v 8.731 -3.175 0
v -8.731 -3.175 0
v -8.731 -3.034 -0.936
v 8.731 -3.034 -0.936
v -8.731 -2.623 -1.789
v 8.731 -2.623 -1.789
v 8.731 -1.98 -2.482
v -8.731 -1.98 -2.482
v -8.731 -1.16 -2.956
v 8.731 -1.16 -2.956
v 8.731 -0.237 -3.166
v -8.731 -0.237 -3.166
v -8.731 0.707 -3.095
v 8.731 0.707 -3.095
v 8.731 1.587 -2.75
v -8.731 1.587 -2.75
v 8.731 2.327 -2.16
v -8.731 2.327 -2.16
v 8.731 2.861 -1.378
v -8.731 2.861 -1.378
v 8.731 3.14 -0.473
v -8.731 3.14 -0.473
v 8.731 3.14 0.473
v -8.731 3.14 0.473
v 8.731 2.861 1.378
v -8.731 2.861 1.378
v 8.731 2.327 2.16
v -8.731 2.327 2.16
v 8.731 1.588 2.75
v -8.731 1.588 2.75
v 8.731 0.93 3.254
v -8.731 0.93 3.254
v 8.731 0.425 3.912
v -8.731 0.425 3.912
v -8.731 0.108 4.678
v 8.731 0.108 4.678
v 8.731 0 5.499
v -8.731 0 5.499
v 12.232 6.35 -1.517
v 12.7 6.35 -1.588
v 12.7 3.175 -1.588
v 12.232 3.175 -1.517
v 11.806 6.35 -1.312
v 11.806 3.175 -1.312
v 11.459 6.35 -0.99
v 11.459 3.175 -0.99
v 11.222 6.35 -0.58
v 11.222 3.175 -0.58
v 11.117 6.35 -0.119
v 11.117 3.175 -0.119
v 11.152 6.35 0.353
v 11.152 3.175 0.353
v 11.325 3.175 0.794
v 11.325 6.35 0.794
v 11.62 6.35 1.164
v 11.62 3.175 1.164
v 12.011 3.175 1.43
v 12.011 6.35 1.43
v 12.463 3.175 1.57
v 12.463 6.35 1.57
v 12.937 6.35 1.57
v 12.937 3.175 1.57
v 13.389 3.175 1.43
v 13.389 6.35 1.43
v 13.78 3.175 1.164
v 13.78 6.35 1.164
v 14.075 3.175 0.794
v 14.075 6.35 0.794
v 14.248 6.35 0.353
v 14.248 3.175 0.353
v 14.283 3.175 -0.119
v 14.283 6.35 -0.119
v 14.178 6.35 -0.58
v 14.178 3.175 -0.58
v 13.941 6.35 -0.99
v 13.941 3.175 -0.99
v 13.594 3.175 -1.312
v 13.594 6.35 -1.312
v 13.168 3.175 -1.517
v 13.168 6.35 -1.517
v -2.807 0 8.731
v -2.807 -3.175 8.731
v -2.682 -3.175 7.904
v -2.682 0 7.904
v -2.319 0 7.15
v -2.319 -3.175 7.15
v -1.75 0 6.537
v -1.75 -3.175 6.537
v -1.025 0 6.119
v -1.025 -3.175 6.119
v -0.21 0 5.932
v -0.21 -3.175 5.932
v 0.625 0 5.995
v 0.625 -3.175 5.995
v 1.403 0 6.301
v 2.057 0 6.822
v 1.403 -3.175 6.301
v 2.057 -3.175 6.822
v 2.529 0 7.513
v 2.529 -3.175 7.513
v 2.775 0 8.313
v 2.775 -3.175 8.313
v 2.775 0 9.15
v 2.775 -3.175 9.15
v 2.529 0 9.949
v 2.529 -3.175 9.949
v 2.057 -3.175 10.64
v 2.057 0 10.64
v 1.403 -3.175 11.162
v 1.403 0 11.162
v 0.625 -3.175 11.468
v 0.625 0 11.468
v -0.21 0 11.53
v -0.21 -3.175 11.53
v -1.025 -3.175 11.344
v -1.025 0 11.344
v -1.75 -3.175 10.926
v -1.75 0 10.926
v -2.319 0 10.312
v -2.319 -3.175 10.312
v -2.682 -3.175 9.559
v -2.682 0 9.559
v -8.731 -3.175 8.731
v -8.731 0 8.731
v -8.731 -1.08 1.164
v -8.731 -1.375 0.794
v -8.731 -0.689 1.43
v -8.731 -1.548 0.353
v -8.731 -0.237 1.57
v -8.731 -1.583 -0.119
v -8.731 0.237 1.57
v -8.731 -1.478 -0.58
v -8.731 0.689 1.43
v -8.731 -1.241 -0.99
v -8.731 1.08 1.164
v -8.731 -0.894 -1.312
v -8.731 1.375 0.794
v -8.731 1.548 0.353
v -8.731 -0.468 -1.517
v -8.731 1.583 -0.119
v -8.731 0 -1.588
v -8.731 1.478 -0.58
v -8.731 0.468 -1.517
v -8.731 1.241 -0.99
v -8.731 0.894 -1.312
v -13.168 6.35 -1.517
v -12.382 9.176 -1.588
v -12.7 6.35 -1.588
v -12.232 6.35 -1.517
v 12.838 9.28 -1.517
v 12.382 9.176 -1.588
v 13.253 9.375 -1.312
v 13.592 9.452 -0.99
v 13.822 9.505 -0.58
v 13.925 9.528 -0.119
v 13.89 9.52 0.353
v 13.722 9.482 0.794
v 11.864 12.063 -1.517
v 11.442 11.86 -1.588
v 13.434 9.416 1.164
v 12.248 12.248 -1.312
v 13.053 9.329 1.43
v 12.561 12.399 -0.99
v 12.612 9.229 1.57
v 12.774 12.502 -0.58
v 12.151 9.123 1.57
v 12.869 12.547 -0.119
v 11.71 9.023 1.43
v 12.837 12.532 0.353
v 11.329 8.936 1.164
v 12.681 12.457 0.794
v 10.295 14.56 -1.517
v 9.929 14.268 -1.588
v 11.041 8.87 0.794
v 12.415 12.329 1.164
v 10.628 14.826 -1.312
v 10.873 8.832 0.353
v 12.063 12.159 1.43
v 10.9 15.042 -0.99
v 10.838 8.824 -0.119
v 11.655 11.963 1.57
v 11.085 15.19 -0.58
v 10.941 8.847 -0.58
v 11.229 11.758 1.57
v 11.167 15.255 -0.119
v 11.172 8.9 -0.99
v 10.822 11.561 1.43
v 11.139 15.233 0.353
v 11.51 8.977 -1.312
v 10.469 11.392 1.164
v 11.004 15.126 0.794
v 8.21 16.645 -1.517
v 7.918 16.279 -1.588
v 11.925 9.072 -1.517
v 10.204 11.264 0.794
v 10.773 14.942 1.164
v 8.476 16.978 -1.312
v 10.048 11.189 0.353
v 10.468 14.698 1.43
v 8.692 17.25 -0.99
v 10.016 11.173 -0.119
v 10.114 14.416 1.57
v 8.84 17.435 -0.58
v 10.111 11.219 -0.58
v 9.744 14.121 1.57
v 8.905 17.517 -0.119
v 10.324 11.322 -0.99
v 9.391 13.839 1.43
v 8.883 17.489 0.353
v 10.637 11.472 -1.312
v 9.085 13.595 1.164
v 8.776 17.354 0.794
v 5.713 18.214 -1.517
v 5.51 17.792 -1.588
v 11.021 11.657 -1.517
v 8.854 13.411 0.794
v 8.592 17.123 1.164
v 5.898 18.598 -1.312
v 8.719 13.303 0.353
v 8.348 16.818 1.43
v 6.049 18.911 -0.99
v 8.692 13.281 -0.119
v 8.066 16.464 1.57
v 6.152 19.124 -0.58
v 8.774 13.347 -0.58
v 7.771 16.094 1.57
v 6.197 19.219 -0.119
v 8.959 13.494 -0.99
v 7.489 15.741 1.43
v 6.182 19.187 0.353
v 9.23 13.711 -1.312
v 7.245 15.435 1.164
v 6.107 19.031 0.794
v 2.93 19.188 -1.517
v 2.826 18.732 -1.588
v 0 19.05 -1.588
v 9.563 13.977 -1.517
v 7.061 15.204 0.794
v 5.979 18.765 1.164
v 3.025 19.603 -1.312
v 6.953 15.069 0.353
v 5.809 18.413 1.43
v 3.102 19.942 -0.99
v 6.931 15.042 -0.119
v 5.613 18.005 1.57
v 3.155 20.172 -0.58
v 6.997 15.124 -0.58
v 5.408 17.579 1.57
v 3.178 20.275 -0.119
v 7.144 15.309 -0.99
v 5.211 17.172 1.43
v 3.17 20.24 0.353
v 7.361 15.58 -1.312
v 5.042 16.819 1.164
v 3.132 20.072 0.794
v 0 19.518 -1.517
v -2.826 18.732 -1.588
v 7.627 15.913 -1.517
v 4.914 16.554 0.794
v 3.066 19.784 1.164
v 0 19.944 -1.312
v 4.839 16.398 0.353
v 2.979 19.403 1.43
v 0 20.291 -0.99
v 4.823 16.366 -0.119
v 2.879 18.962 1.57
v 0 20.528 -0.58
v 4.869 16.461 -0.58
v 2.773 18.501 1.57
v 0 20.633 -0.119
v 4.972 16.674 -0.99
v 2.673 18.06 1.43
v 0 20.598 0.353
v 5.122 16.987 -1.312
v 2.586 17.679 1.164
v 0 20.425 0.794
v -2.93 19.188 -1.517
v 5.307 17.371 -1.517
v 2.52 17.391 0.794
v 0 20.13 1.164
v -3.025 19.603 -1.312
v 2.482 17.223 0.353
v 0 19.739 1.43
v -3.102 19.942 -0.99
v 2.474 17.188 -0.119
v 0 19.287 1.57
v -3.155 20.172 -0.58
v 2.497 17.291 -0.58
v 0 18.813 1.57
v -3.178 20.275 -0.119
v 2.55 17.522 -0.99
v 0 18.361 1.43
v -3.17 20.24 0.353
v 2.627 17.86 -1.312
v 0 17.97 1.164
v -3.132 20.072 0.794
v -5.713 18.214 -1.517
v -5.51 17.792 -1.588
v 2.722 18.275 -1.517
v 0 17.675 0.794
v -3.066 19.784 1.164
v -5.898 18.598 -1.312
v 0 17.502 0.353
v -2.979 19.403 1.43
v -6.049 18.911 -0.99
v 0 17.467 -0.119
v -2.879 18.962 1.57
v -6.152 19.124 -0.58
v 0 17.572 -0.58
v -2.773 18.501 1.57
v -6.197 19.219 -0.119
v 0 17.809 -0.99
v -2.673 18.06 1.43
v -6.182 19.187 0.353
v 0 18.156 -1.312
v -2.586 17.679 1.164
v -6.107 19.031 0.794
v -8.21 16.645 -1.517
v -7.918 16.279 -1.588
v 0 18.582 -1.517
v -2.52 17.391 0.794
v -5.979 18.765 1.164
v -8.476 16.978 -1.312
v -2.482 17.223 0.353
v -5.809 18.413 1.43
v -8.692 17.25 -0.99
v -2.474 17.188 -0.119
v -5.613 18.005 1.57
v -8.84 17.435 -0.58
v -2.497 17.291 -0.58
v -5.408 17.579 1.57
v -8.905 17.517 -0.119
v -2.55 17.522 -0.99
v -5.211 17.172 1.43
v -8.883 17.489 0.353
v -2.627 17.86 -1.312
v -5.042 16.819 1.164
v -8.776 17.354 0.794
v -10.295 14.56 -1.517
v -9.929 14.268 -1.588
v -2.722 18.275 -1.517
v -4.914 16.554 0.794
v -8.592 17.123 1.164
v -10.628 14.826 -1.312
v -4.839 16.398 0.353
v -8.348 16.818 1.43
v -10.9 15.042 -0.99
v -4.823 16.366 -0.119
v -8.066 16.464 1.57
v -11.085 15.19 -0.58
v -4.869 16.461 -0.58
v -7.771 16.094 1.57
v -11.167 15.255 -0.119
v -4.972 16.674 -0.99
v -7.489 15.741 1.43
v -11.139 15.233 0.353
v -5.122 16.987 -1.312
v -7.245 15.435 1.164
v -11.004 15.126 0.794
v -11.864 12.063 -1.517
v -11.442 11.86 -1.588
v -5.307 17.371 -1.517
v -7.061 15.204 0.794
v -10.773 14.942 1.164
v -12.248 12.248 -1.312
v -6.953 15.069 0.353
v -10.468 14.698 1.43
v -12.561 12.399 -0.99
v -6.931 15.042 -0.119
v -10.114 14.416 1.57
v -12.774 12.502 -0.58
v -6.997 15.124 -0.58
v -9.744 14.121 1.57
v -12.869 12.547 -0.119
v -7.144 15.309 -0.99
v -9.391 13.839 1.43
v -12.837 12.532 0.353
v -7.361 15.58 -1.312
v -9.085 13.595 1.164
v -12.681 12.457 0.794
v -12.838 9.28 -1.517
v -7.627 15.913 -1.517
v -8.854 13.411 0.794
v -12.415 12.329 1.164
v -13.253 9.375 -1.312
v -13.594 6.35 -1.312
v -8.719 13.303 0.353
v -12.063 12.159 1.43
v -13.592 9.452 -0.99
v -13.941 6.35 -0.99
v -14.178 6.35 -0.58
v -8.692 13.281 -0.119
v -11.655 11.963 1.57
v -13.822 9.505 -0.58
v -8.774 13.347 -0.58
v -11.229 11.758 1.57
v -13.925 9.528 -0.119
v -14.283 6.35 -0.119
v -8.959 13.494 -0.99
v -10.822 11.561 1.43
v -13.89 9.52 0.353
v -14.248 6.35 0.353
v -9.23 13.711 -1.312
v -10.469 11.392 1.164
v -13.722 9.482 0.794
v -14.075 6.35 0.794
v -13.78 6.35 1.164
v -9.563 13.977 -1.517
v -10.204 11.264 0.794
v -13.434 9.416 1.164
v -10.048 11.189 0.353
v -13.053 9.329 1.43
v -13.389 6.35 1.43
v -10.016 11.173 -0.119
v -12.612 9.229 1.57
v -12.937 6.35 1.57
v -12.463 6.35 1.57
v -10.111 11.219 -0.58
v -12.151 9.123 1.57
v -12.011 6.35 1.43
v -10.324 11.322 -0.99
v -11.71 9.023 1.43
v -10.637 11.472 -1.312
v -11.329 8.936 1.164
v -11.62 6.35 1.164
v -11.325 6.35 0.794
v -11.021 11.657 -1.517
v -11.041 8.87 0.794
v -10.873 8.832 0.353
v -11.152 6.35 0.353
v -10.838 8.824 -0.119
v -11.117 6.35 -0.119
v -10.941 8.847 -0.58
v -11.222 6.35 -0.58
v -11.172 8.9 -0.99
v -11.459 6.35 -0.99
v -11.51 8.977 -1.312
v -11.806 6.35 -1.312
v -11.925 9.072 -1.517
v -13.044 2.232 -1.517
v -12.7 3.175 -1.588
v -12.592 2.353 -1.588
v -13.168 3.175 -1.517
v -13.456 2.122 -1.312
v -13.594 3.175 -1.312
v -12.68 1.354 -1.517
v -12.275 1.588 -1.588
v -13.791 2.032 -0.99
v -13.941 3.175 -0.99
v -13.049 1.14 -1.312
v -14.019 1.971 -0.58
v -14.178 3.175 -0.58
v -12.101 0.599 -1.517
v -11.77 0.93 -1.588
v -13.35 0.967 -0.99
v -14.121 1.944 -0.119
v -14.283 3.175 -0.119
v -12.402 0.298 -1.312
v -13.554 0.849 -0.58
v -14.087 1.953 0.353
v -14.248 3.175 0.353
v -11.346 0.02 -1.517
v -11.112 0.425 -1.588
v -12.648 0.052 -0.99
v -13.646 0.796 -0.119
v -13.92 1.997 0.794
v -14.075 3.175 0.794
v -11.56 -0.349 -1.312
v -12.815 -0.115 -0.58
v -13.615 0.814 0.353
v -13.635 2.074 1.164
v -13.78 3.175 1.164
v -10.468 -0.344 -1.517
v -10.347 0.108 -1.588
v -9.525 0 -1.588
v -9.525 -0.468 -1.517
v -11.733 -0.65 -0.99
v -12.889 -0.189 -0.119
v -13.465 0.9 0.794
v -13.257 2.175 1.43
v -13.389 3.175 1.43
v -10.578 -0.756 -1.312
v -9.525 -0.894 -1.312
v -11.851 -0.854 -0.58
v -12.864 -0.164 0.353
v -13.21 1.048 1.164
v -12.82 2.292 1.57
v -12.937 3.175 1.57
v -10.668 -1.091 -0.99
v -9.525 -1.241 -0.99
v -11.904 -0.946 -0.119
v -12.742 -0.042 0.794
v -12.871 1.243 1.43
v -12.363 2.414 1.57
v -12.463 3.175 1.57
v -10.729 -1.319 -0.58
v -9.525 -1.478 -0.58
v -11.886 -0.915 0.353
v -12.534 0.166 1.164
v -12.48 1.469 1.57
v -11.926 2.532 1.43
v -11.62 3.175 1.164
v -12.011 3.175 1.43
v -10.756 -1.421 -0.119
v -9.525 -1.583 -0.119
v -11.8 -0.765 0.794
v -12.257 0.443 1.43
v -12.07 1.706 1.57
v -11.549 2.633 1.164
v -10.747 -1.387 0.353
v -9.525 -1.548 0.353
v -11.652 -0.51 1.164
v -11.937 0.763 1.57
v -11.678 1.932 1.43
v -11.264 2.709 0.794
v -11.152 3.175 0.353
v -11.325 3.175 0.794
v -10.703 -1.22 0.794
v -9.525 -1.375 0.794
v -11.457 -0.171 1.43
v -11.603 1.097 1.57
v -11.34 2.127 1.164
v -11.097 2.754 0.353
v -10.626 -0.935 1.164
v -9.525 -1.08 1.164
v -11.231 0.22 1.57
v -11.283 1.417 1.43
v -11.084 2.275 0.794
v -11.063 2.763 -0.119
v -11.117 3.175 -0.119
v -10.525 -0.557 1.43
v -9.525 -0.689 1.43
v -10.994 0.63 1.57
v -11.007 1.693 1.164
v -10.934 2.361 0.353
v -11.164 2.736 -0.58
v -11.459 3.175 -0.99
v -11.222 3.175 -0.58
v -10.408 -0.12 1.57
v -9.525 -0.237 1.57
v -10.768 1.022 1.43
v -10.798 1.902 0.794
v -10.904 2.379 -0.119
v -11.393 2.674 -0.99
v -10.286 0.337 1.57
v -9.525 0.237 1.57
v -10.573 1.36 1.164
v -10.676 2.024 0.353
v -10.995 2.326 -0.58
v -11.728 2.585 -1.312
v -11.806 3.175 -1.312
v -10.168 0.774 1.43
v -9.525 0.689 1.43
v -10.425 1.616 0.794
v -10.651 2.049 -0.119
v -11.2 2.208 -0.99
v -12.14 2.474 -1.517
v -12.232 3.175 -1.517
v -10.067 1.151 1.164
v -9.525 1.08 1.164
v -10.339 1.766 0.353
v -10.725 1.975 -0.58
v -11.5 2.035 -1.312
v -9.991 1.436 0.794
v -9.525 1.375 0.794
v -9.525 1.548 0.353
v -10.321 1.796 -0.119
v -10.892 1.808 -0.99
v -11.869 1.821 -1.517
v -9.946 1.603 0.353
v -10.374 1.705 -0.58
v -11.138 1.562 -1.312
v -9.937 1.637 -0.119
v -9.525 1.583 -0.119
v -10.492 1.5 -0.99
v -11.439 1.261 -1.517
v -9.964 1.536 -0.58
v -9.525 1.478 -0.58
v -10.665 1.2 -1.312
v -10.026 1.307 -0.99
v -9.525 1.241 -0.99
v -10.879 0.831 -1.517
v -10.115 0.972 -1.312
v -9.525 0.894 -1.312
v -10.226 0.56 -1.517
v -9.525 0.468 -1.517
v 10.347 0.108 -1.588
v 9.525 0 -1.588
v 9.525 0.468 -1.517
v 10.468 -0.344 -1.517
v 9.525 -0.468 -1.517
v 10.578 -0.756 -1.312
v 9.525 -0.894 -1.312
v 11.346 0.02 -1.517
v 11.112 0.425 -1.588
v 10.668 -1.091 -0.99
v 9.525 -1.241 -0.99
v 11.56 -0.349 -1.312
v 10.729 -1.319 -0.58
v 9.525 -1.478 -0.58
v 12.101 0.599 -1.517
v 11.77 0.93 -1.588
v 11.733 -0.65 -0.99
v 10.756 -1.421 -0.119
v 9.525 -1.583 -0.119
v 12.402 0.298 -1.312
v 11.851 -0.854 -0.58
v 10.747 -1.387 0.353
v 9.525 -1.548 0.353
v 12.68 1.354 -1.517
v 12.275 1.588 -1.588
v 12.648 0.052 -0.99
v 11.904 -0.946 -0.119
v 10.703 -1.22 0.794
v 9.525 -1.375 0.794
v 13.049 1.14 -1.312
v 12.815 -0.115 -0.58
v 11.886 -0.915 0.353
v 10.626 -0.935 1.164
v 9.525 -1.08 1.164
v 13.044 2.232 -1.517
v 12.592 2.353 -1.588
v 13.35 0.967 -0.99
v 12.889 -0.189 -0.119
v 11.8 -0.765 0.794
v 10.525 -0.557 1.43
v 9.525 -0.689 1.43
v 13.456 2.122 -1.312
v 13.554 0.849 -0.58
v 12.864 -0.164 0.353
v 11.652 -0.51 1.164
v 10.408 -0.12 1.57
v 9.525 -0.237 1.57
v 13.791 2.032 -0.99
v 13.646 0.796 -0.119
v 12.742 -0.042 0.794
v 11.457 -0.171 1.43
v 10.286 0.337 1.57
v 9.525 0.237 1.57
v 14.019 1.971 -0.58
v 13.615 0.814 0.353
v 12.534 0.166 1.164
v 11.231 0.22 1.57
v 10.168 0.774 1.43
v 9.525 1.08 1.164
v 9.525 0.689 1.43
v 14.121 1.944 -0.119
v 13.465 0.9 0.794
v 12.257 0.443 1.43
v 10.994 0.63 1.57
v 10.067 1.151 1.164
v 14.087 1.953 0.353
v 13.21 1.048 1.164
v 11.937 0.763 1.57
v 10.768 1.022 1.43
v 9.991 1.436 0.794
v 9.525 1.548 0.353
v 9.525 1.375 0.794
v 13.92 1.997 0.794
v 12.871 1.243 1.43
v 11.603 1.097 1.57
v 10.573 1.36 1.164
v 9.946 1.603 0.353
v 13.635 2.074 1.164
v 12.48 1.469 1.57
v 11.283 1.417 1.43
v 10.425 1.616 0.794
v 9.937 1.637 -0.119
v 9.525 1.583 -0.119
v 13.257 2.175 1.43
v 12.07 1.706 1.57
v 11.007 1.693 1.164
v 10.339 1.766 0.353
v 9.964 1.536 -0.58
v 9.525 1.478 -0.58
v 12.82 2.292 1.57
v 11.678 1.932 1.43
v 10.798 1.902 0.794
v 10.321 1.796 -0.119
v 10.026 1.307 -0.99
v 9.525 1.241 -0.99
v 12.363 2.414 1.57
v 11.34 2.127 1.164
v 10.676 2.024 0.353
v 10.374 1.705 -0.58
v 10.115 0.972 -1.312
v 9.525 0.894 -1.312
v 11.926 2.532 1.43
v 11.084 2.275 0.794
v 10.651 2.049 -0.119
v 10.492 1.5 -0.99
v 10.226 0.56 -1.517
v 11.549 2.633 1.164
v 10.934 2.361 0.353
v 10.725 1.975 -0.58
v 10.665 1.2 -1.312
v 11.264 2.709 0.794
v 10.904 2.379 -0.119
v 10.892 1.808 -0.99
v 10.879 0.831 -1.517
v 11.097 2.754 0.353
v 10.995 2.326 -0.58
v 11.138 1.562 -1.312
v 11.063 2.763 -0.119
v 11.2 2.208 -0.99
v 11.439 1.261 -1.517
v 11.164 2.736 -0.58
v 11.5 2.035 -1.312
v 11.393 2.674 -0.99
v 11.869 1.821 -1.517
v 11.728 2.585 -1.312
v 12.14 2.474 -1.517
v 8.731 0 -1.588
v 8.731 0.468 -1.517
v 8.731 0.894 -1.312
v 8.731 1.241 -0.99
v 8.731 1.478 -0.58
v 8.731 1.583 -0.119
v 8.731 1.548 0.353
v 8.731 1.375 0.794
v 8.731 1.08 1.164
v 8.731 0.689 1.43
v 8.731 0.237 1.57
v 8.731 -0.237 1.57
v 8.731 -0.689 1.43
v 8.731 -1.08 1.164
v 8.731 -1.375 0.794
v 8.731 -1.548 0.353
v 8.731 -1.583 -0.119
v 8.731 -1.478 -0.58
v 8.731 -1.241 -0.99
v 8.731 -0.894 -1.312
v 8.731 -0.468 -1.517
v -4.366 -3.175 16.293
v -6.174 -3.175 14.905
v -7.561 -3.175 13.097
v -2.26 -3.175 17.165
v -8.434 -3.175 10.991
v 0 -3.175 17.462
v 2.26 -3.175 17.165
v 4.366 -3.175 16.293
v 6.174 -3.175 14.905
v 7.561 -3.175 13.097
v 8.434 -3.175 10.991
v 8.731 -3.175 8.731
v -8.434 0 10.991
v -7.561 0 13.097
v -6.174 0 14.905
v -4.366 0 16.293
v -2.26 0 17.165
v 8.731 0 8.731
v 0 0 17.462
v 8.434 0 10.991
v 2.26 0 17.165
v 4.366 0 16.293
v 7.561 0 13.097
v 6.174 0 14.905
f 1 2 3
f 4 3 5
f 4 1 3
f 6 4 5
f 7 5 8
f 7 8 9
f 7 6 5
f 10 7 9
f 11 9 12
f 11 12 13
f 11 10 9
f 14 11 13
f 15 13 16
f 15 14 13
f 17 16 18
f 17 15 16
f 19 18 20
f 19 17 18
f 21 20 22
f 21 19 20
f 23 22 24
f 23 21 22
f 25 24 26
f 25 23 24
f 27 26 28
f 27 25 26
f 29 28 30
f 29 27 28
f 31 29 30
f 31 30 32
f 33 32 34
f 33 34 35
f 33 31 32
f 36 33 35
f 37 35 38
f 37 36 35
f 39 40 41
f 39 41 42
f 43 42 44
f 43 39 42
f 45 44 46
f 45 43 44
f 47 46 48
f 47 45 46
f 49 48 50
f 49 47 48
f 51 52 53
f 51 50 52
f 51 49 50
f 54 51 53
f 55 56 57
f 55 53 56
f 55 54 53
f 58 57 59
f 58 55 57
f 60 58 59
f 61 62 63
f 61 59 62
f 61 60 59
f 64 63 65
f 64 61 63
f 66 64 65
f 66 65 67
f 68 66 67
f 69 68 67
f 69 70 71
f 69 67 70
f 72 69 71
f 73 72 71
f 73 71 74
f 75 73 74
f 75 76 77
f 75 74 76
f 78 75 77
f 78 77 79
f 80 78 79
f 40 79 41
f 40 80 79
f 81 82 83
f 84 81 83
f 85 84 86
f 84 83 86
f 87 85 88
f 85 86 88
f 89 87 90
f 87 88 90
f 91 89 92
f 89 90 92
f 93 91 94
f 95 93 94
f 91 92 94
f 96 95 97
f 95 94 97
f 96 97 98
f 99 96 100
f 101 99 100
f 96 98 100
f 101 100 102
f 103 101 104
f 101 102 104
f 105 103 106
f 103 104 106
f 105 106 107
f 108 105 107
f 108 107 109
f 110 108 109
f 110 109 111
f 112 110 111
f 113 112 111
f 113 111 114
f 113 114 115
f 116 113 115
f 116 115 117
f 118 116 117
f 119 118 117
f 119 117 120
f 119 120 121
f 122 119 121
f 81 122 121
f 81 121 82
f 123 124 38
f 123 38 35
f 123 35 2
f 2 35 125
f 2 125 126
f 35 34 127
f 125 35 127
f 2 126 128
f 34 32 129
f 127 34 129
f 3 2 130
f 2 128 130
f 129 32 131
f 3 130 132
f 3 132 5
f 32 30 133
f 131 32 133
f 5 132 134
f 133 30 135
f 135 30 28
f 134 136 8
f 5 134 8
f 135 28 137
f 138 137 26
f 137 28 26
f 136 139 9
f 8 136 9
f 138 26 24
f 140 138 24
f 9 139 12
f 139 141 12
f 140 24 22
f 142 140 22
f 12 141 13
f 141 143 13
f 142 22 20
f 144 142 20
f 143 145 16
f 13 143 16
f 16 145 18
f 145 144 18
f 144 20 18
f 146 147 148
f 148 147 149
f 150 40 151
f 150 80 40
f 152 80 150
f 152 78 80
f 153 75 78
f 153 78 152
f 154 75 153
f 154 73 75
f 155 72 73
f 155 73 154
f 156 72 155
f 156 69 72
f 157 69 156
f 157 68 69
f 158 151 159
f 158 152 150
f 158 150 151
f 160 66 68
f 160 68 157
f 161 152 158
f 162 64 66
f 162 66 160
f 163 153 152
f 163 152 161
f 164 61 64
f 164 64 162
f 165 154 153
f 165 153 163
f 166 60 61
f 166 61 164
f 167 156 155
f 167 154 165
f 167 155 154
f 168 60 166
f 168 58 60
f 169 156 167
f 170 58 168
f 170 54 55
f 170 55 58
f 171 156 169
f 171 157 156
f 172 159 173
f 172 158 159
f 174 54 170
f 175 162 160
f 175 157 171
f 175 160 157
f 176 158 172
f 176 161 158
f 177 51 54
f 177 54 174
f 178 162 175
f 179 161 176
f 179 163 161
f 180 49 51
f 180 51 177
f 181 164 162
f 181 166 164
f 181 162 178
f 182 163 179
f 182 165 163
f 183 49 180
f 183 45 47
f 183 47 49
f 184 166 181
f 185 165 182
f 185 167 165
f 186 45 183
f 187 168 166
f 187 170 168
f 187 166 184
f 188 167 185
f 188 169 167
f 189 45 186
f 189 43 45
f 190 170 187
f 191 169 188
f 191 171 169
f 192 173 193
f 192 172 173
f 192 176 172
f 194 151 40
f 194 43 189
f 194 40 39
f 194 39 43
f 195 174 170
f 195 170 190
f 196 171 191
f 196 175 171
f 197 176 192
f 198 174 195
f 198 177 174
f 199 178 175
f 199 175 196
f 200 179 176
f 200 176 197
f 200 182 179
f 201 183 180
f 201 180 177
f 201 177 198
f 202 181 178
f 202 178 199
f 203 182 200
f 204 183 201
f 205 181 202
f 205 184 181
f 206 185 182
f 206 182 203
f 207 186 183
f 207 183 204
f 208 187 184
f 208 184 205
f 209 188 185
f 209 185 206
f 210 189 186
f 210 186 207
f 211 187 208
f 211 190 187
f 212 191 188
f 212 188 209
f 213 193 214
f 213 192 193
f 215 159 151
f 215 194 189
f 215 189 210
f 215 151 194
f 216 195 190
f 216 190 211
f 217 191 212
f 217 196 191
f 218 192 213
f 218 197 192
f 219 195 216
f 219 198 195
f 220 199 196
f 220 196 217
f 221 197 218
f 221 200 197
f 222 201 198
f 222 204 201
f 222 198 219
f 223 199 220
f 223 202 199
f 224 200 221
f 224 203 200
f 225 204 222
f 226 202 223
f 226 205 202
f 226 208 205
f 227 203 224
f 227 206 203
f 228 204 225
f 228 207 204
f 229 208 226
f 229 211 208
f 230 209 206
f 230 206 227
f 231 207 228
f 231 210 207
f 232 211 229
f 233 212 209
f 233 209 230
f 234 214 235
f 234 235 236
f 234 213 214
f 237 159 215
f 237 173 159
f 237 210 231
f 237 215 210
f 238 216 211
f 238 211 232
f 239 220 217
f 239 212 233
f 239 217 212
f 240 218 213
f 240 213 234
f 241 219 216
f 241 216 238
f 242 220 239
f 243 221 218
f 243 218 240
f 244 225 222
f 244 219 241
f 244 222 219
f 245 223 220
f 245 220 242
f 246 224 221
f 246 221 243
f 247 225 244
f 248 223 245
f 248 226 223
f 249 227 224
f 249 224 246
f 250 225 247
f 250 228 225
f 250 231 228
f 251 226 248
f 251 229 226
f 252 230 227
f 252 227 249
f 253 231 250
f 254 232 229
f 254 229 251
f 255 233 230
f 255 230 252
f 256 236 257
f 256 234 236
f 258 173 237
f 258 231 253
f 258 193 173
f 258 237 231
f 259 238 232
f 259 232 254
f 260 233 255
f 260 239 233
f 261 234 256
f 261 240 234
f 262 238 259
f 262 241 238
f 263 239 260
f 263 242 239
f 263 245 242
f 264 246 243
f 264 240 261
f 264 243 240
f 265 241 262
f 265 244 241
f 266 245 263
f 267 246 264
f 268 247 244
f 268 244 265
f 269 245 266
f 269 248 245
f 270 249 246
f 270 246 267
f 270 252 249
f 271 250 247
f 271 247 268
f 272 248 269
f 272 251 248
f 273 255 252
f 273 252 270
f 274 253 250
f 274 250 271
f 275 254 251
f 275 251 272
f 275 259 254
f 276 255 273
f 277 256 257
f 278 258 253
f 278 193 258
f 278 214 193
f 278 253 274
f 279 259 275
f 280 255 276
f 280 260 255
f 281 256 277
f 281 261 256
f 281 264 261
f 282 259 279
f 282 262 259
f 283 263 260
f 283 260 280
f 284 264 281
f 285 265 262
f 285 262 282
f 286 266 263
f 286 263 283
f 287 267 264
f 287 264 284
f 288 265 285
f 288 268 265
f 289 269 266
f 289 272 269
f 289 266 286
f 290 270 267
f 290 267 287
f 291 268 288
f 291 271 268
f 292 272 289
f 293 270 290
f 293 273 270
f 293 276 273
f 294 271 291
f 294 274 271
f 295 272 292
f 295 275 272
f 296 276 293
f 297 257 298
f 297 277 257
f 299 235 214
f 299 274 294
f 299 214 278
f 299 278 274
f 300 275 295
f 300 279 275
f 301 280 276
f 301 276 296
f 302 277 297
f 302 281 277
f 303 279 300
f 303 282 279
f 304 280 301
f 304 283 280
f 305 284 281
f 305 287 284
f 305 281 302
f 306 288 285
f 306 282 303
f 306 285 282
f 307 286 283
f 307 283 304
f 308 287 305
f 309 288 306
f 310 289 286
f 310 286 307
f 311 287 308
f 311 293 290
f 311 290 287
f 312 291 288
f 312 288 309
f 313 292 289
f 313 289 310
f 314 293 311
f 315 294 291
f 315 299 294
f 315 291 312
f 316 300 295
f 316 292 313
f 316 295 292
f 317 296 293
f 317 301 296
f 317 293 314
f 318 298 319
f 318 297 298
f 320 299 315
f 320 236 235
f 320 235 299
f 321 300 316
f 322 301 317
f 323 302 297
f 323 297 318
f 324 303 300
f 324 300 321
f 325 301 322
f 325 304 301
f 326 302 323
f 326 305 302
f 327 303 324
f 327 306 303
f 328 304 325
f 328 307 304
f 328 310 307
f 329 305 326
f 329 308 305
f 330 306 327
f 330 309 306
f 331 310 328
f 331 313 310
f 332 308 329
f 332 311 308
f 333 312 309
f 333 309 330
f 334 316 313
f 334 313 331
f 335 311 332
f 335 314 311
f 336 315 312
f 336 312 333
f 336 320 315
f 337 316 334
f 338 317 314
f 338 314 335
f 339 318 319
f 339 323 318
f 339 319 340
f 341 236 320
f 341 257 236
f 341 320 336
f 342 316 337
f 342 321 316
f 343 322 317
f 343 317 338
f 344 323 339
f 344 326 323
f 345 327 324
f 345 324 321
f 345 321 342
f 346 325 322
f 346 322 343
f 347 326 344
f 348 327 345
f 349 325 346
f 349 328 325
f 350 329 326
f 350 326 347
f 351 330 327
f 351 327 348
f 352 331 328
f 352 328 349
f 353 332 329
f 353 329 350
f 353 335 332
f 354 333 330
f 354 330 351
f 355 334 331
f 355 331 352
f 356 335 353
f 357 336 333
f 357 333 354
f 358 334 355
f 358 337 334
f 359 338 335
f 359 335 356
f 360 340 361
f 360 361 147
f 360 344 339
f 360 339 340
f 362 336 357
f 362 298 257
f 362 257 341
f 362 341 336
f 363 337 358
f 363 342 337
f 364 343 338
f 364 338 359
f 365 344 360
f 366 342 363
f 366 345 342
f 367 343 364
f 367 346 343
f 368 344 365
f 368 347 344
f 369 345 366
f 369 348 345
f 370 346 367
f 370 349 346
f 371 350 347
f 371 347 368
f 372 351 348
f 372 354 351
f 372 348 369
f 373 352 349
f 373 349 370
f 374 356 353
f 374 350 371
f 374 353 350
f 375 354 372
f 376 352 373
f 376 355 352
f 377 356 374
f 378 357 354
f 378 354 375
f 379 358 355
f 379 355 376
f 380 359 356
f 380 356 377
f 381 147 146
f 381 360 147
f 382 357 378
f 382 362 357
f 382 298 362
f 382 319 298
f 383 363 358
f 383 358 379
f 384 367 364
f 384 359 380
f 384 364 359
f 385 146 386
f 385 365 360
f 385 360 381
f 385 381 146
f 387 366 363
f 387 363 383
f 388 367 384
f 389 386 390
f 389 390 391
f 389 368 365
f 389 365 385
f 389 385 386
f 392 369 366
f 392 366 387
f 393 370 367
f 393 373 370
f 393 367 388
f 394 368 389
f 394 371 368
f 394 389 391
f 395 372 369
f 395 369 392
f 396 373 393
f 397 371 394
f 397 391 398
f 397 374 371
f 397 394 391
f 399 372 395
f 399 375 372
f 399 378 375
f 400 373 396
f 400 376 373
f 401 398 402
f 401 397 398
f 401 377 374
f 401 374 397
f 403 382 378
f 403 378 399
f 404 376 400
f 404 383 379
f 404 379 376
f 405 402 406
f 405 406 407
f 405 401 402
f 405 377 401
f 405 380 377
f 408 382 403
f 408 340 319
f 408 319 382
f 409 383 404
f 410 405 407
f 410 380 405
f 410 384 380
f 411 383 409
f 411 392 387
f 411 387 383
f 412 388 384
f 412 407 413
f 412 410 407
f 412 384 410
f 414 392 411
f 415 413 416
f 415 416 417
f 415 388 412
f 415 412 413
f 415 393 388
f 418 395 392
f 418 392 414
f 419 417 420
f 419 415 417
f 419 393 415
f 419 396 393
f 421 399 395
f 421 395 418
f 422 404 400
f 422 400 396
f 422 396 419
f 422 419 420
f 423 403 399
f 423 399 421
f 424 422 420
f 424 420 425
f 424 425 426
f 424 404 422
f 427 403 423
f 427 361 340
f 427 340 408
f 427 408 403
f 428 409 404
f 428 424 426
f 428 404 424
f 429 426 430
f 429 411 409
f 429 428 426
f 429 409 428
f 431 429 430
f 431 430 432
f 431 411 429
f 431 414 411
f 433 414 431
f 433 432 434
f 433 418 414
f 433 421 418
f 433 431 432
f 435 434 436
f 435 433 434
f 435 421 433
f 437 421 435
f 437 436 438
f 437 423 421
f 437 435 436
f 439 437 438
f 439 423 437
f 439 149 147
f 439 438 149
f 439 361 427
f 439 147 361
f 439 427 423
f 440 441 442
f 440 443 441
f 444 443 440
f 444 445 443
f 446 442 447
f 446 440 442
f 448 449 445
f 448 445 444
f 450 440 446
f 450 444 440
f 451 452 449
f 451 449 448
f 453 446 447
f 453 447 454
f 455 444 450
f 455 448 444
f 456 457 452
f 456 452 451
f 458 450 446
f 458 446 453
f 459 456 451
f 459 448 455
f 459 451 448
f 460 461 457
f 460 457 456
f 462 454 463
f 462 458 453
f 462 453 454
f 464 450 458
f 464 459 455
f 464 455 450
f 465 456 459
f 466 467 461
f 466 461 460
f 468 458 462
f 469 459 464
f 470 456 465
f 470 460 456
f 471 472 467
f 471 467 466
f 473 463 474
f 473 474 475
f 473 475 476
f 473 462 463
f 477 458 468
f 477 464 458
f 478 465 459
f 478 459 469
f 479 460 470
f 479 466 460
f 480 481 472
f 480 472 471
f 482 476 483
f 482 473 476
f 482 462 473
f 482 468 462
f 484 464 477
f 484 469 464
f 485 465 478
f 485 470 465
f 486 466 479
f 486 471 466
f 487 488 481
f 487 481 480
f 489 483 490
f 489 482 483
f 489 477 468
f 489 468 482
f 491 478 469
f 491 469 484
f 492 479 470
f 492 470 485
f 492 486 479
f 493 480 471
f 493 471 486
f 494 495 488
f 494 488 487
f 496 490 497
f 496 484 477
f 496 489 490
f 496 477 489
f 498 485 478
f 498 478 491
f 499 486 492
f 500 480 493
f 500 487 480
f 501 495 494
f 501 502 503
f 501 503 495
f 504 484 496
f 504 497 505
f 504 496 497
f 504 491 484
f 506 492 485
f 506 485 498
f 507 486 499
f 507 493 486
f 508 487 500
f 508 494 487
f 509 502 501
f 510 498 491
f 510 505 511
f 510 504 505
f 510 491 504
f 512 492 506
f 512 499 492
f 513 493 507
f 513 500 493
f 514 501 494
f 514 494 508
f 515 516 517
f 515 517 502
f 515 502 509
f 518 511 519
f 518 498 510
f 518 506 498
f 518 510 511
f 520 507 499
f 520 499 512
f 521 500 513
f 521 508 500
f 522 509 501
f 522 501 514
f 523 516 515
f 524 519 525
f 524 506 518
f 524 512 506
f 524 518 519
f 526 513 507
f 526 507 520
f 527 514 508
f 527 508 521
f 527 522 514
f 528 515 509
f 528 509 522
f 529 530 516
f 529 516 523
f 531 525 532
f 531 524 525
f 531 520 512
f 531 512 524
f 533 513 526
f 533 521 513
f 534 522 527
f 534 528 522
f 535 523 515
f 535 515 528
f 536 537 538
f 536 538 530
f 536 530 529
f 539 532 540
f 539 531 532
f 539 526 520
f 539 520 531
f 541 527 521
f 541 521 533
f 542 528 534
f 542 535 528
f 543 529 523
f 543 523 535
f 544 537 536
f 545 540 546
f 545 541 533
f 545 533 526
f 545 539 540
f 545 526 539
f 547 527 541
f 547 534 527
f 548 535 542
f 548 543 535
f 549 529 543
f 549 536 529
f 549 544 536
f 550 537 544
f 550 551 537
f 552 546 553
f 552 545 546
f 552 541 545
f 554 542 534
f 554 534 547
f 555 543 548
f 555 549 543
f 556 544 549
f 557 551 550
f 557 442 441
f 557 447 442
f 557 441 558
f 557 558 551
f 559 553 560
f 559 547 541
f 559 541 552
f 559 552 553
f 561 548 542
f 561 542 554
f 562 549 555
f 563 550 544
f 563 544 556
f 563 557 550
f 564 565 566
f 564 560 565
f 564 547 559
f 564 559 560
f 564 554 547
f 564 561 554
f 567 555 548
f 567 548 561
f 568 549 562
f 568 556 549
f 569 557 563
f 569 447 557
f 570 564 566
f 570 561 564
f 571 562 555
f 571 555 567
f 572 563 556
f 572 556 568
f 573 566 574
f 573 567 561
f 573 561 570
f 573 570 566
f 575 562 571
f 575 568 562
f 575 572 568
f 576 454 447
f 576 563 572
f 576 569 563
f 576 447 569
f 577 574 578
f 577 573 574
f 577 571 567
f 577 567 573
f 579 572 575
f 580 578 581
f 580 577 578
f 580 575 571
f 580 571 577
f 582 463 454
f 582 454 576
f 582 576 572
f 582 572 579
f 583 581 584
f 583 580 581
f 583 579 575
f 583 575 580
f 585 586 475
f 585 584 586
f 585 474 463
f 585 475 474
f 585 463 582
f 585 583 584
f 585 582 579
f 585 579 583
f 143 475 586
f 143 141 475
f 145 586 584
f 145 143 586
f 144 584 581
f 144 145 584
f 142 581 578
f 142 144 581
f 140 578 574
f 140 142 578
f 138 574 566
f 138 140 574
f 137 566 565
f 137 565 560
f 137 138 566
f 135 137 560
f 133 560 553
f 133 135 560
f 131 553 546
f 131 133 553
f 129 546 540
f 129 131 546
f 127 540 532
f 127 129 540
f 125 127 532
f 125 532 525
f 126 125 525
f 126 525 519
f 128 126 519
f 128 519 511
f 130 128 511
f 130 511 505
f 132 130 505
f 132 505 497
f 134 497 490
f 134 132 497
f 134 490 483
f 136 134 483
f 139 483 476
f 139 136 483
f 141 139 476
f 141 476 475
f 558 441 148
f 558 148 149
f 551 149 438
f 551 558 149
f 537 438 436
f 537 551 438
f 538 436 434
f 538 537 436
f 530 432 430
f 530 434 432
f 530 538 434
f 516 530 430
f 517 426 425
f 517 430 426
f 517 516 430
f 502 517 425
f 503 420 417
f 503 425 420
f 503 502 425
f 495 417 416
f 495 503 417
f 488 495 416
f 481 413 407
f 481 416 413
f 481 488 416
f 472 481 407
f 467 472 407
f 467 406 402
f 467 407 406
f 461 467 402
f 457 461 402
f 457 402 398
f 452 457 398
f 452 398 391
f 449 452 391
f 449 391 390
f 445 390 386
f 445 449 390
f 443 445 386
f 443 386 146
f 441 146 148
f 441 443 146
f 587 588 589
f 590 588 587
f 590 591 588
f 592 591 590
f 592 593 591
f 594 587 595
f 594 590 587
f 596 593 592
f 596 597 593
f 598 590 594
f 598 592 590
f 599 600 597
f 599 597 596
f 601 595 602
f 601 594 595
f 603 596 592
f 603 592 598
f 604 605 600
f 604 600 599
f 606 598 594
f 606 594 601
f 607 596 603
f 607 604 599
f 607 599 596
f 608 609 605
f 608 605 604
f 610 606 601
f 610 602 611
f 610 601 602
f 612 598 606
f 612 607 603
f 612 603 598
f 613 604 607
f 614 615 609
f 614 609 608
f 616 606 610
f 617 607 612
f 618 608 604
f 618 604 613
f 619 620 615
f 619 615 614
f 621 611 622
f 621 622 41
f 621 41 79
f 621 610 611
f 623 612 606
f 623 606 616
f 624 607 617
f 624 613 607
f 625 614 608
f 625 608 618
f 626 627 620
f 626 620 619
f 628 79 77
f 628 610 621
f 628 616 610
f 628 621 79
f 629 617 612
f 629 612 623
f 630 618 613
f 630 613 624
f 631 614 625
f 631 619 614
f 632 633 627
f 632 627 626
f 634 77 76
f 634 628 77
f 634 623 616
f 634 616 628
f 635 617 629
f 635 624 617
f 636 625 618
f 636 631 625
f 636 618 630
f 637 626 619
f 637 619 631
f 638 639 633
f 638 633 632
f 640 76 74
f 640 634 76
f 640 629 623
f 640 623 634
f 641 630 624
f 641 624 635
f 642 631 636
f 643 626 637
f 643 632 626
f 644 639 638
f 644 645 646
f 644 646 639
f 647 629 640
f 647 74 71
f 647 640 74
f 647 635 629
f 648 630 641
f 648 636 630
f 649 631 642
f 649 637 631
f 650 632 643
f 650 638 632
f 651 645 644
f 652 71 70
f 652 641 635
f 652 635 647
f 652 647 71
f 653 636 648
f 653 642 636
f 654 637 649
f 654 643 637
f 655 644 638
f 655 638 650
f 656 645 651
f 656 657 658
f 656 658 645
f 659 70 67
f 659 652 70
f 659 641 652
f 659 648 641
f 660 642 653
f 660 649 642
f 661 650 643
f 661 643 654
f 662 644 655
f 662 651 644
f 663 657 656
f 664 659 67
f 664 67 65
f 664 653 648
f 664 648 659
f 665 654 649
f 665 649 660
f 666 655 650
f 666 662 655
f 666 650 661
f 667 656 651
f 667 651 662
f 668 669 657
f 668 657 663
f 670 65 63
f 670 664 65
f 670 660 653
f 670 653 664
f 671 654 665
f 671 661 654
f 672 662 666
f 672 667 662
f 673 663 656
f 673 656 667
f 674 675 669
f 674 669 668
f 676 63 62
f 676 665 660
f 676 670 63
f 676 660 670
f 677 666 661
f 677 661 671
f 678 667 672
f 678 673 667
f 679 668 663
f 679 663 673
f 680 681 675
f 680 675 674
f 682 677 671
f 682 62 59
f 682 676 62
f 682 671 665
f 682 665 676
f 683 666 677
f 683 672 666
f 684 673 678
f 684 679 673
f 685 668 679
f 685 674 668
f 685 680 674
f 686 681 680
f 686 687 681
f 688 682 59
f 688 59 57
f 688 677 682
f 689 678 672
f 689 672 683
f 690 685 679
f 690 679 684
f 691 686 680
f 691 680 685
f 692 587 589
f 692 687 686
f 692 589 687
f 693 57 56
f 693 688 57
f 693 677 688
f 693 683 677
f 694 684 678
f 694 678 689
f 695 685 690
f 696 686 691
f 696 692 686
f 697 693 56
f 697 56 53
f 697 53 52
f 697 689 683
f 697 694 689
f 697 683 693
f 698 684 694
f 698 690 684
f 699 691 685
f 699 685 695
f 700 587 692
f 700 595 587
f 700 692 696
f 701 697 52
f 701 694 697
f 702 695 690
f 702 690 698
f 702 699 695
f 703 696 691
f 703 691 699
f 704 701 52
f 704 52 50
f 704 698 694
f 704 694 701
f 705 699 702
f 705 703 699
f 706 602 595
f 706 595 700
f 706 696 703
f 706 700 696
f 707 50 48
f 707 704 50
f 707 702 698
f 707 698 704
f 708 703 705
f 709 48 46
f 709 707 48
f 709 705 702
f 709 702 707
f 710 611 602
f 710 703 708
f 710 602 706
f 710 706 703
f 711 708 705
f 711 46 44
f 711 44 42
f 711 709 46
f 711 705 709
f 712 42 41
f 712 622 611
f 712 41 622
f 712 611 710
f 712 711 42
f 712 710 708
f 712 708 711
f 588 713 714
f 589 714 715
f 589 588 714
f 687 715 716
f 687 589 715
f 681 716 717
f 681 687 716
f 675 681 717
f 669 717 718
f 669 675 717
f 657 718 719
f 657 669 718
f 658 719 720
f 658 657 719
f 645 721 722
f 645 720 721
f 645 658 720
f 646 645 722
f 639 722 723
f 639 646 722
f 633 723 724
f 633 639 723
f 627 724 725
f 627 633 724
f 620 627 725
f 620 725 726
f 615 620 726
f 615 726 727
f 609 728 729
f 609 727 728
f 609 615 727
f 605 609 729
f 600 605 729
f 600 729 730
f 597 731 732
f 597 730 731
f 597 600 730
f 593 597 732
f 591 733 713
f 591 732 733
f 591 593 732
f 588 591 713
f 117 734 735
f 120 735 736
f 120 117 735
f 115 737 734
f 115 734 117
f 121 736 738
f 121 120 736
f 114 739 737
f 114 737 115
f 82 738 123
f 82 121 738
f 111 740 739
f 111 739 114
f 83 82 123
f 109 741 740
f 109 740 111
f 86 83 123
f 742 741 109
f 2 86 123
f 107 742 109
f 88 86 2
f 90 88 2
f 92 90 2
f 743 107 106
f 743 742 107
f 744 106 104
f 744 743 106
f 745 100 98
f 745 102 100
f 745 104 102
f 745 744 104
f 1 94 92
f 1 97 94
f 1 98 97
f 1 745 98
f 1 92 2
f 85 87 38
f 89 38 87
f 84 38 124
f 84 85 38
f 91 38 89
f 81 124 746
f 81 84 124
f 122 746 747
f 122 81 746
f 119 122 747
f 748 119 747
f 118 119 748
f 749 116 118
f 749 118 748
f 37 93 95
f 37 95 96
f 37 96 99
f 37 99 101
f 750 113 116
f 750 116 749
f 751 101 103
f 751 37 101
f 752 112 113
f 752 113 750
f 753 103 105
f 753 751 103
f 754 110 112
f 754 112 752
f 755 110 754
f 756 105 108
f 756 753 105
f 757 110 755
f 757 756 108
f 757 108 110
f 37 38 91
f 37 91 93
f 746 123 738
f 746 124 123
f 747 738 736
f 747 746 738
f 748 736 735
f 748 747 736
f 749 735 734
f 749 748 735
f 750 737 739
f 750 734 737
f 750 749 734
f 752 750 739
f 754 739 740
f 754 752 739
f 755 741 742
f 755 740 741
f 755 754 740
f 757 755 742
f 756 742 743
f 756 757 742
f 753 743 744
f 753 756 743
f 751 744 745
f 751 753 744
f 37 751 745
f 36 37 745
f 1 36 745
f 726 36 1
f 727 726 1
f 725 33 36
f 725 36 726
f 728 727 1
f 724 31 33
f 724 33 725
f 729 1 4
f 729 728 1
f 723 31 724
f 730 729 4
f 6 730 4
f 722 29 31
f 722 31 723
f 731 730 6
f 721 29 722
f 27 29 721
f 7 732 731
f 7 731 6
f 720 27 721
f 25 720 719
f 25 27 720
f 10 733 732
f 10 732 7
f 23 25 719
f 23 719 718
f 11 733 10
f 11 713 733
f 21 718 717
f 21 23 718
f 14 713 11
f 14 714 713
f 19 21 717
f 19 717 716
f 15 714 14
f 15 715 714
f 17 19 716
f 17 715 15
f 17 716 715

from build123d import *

# Parameters (mm, degrees)
SKETCH3_R                  = 1.5875
SKETCH4_R                  = 1.5875
BOSS_EXTRUDE1_DEPTH        = 8.73125
FILLET1_RADIUS             = 8.73125
FILLET1_LENGTH             = 3.175
F_2_0_221_DIAMETER_HOLE1_D = 5.6134


with BuildPart() as part:
    # Sweep1: sweep along a path in Sketch2
    with BuildLine(Plane.XY) as sweep1_path:
        Line((-9.525, 0), (9.525, 0))
        ThreePointArc((9.525, 0), (11.77006403, 0.92993597), (12.7, 3.175))
        Line((12.7, 3.175), (12.7, 6.35))
        ThreePointArc((12.7, 6.35), (0, 19.05), (-12.7, 6.35))
        Line((-12.7, 6.35), (-12.7, 3.175))
        ThreePointArc((-12.7, 3.175), (-11.77006403, 0.92993597), (-9.525, 0))
    # Sketch3 → Sweep1 (sweep)
    with BuildSketch(Plane(origin=(0, 0, 0), x_dir=(0, 0, -1), z_dir=(1, 0, 0))):
        Circle(SKETCH3_R)
    sweep(path=sweep1_path.line)

    # Sketch4 → Boss-Extrude1 (add, symmetric)
    with BuildSketch(Plane(origin=(0, 0, 0), x_dir=(0, 0, -1), z_dir=(1, 0, 0))):
        with BuildLine():
            Line((-17.4625, -3.175), (0, -3.175))
            ThreePointArc((0, -3.175), (2.749630657, 1.5875), (-2.749630657, 1.5875))
            ThreePointArc((-2.749630657, 1.5875), (-3.911761314, 0.425369343), (-5.499261314, 0))
            Line((-5.499261314, 0), (-17.4625, 0))
            Line((-17.4625, 0), (-17.4625, -3.175))
        make_face()
        with Locations(Location((0, 0, 0), (0, 0, 180))):
            Circle(SKETCH4_R, mode=Mode.SUBTRACT)
    extrude(amount=BOSS_EXTRUDE1_DEPTH, both=True)

    # Fillet1: full round fillet: the end face becomes a half cylinder, R = half its width
    fillet1_face = Plane((0, -1.5875, 17.4625), x_dir=(0, 1, 0), z_dir=(0, 0, 1))  # on the end face: x along it, z out of the body
    fillet1_slab = fillet1_face.offset(-FILLET1_RADIUS / 2) * Box(FILLET1_LENGTH, 2 * FILLET1_RADIUS, FILLET1_RADIUS, mode=Mode.PRIVATE)  # the body's end, R deep
    fillet1_round = Plane((0, -1.5875, 8.73125), x_dir=(0, 0, 1), z_dir=(0, 1, 0)) * Cylinder(FILLET1_RADIUS, FILLET1_LENGTH, mode=Mode.PRIVATE)  # its axis R under the face
    add(fillet1_slab - fillet1_round, mode=Mode.SUBTRACT)

    # #2 (0.221) Diameter Hole1 (through all)
    with Locations(Plane(origin=(0, 0, 0), x_dir=(1, 0, 0), z_dir=(0, 1, 0))):
        with Locations((0, -8.73125)):
            Hole(F_2_0_221_DIAMETER_HOLE1_D / 2)


solid = part.part
